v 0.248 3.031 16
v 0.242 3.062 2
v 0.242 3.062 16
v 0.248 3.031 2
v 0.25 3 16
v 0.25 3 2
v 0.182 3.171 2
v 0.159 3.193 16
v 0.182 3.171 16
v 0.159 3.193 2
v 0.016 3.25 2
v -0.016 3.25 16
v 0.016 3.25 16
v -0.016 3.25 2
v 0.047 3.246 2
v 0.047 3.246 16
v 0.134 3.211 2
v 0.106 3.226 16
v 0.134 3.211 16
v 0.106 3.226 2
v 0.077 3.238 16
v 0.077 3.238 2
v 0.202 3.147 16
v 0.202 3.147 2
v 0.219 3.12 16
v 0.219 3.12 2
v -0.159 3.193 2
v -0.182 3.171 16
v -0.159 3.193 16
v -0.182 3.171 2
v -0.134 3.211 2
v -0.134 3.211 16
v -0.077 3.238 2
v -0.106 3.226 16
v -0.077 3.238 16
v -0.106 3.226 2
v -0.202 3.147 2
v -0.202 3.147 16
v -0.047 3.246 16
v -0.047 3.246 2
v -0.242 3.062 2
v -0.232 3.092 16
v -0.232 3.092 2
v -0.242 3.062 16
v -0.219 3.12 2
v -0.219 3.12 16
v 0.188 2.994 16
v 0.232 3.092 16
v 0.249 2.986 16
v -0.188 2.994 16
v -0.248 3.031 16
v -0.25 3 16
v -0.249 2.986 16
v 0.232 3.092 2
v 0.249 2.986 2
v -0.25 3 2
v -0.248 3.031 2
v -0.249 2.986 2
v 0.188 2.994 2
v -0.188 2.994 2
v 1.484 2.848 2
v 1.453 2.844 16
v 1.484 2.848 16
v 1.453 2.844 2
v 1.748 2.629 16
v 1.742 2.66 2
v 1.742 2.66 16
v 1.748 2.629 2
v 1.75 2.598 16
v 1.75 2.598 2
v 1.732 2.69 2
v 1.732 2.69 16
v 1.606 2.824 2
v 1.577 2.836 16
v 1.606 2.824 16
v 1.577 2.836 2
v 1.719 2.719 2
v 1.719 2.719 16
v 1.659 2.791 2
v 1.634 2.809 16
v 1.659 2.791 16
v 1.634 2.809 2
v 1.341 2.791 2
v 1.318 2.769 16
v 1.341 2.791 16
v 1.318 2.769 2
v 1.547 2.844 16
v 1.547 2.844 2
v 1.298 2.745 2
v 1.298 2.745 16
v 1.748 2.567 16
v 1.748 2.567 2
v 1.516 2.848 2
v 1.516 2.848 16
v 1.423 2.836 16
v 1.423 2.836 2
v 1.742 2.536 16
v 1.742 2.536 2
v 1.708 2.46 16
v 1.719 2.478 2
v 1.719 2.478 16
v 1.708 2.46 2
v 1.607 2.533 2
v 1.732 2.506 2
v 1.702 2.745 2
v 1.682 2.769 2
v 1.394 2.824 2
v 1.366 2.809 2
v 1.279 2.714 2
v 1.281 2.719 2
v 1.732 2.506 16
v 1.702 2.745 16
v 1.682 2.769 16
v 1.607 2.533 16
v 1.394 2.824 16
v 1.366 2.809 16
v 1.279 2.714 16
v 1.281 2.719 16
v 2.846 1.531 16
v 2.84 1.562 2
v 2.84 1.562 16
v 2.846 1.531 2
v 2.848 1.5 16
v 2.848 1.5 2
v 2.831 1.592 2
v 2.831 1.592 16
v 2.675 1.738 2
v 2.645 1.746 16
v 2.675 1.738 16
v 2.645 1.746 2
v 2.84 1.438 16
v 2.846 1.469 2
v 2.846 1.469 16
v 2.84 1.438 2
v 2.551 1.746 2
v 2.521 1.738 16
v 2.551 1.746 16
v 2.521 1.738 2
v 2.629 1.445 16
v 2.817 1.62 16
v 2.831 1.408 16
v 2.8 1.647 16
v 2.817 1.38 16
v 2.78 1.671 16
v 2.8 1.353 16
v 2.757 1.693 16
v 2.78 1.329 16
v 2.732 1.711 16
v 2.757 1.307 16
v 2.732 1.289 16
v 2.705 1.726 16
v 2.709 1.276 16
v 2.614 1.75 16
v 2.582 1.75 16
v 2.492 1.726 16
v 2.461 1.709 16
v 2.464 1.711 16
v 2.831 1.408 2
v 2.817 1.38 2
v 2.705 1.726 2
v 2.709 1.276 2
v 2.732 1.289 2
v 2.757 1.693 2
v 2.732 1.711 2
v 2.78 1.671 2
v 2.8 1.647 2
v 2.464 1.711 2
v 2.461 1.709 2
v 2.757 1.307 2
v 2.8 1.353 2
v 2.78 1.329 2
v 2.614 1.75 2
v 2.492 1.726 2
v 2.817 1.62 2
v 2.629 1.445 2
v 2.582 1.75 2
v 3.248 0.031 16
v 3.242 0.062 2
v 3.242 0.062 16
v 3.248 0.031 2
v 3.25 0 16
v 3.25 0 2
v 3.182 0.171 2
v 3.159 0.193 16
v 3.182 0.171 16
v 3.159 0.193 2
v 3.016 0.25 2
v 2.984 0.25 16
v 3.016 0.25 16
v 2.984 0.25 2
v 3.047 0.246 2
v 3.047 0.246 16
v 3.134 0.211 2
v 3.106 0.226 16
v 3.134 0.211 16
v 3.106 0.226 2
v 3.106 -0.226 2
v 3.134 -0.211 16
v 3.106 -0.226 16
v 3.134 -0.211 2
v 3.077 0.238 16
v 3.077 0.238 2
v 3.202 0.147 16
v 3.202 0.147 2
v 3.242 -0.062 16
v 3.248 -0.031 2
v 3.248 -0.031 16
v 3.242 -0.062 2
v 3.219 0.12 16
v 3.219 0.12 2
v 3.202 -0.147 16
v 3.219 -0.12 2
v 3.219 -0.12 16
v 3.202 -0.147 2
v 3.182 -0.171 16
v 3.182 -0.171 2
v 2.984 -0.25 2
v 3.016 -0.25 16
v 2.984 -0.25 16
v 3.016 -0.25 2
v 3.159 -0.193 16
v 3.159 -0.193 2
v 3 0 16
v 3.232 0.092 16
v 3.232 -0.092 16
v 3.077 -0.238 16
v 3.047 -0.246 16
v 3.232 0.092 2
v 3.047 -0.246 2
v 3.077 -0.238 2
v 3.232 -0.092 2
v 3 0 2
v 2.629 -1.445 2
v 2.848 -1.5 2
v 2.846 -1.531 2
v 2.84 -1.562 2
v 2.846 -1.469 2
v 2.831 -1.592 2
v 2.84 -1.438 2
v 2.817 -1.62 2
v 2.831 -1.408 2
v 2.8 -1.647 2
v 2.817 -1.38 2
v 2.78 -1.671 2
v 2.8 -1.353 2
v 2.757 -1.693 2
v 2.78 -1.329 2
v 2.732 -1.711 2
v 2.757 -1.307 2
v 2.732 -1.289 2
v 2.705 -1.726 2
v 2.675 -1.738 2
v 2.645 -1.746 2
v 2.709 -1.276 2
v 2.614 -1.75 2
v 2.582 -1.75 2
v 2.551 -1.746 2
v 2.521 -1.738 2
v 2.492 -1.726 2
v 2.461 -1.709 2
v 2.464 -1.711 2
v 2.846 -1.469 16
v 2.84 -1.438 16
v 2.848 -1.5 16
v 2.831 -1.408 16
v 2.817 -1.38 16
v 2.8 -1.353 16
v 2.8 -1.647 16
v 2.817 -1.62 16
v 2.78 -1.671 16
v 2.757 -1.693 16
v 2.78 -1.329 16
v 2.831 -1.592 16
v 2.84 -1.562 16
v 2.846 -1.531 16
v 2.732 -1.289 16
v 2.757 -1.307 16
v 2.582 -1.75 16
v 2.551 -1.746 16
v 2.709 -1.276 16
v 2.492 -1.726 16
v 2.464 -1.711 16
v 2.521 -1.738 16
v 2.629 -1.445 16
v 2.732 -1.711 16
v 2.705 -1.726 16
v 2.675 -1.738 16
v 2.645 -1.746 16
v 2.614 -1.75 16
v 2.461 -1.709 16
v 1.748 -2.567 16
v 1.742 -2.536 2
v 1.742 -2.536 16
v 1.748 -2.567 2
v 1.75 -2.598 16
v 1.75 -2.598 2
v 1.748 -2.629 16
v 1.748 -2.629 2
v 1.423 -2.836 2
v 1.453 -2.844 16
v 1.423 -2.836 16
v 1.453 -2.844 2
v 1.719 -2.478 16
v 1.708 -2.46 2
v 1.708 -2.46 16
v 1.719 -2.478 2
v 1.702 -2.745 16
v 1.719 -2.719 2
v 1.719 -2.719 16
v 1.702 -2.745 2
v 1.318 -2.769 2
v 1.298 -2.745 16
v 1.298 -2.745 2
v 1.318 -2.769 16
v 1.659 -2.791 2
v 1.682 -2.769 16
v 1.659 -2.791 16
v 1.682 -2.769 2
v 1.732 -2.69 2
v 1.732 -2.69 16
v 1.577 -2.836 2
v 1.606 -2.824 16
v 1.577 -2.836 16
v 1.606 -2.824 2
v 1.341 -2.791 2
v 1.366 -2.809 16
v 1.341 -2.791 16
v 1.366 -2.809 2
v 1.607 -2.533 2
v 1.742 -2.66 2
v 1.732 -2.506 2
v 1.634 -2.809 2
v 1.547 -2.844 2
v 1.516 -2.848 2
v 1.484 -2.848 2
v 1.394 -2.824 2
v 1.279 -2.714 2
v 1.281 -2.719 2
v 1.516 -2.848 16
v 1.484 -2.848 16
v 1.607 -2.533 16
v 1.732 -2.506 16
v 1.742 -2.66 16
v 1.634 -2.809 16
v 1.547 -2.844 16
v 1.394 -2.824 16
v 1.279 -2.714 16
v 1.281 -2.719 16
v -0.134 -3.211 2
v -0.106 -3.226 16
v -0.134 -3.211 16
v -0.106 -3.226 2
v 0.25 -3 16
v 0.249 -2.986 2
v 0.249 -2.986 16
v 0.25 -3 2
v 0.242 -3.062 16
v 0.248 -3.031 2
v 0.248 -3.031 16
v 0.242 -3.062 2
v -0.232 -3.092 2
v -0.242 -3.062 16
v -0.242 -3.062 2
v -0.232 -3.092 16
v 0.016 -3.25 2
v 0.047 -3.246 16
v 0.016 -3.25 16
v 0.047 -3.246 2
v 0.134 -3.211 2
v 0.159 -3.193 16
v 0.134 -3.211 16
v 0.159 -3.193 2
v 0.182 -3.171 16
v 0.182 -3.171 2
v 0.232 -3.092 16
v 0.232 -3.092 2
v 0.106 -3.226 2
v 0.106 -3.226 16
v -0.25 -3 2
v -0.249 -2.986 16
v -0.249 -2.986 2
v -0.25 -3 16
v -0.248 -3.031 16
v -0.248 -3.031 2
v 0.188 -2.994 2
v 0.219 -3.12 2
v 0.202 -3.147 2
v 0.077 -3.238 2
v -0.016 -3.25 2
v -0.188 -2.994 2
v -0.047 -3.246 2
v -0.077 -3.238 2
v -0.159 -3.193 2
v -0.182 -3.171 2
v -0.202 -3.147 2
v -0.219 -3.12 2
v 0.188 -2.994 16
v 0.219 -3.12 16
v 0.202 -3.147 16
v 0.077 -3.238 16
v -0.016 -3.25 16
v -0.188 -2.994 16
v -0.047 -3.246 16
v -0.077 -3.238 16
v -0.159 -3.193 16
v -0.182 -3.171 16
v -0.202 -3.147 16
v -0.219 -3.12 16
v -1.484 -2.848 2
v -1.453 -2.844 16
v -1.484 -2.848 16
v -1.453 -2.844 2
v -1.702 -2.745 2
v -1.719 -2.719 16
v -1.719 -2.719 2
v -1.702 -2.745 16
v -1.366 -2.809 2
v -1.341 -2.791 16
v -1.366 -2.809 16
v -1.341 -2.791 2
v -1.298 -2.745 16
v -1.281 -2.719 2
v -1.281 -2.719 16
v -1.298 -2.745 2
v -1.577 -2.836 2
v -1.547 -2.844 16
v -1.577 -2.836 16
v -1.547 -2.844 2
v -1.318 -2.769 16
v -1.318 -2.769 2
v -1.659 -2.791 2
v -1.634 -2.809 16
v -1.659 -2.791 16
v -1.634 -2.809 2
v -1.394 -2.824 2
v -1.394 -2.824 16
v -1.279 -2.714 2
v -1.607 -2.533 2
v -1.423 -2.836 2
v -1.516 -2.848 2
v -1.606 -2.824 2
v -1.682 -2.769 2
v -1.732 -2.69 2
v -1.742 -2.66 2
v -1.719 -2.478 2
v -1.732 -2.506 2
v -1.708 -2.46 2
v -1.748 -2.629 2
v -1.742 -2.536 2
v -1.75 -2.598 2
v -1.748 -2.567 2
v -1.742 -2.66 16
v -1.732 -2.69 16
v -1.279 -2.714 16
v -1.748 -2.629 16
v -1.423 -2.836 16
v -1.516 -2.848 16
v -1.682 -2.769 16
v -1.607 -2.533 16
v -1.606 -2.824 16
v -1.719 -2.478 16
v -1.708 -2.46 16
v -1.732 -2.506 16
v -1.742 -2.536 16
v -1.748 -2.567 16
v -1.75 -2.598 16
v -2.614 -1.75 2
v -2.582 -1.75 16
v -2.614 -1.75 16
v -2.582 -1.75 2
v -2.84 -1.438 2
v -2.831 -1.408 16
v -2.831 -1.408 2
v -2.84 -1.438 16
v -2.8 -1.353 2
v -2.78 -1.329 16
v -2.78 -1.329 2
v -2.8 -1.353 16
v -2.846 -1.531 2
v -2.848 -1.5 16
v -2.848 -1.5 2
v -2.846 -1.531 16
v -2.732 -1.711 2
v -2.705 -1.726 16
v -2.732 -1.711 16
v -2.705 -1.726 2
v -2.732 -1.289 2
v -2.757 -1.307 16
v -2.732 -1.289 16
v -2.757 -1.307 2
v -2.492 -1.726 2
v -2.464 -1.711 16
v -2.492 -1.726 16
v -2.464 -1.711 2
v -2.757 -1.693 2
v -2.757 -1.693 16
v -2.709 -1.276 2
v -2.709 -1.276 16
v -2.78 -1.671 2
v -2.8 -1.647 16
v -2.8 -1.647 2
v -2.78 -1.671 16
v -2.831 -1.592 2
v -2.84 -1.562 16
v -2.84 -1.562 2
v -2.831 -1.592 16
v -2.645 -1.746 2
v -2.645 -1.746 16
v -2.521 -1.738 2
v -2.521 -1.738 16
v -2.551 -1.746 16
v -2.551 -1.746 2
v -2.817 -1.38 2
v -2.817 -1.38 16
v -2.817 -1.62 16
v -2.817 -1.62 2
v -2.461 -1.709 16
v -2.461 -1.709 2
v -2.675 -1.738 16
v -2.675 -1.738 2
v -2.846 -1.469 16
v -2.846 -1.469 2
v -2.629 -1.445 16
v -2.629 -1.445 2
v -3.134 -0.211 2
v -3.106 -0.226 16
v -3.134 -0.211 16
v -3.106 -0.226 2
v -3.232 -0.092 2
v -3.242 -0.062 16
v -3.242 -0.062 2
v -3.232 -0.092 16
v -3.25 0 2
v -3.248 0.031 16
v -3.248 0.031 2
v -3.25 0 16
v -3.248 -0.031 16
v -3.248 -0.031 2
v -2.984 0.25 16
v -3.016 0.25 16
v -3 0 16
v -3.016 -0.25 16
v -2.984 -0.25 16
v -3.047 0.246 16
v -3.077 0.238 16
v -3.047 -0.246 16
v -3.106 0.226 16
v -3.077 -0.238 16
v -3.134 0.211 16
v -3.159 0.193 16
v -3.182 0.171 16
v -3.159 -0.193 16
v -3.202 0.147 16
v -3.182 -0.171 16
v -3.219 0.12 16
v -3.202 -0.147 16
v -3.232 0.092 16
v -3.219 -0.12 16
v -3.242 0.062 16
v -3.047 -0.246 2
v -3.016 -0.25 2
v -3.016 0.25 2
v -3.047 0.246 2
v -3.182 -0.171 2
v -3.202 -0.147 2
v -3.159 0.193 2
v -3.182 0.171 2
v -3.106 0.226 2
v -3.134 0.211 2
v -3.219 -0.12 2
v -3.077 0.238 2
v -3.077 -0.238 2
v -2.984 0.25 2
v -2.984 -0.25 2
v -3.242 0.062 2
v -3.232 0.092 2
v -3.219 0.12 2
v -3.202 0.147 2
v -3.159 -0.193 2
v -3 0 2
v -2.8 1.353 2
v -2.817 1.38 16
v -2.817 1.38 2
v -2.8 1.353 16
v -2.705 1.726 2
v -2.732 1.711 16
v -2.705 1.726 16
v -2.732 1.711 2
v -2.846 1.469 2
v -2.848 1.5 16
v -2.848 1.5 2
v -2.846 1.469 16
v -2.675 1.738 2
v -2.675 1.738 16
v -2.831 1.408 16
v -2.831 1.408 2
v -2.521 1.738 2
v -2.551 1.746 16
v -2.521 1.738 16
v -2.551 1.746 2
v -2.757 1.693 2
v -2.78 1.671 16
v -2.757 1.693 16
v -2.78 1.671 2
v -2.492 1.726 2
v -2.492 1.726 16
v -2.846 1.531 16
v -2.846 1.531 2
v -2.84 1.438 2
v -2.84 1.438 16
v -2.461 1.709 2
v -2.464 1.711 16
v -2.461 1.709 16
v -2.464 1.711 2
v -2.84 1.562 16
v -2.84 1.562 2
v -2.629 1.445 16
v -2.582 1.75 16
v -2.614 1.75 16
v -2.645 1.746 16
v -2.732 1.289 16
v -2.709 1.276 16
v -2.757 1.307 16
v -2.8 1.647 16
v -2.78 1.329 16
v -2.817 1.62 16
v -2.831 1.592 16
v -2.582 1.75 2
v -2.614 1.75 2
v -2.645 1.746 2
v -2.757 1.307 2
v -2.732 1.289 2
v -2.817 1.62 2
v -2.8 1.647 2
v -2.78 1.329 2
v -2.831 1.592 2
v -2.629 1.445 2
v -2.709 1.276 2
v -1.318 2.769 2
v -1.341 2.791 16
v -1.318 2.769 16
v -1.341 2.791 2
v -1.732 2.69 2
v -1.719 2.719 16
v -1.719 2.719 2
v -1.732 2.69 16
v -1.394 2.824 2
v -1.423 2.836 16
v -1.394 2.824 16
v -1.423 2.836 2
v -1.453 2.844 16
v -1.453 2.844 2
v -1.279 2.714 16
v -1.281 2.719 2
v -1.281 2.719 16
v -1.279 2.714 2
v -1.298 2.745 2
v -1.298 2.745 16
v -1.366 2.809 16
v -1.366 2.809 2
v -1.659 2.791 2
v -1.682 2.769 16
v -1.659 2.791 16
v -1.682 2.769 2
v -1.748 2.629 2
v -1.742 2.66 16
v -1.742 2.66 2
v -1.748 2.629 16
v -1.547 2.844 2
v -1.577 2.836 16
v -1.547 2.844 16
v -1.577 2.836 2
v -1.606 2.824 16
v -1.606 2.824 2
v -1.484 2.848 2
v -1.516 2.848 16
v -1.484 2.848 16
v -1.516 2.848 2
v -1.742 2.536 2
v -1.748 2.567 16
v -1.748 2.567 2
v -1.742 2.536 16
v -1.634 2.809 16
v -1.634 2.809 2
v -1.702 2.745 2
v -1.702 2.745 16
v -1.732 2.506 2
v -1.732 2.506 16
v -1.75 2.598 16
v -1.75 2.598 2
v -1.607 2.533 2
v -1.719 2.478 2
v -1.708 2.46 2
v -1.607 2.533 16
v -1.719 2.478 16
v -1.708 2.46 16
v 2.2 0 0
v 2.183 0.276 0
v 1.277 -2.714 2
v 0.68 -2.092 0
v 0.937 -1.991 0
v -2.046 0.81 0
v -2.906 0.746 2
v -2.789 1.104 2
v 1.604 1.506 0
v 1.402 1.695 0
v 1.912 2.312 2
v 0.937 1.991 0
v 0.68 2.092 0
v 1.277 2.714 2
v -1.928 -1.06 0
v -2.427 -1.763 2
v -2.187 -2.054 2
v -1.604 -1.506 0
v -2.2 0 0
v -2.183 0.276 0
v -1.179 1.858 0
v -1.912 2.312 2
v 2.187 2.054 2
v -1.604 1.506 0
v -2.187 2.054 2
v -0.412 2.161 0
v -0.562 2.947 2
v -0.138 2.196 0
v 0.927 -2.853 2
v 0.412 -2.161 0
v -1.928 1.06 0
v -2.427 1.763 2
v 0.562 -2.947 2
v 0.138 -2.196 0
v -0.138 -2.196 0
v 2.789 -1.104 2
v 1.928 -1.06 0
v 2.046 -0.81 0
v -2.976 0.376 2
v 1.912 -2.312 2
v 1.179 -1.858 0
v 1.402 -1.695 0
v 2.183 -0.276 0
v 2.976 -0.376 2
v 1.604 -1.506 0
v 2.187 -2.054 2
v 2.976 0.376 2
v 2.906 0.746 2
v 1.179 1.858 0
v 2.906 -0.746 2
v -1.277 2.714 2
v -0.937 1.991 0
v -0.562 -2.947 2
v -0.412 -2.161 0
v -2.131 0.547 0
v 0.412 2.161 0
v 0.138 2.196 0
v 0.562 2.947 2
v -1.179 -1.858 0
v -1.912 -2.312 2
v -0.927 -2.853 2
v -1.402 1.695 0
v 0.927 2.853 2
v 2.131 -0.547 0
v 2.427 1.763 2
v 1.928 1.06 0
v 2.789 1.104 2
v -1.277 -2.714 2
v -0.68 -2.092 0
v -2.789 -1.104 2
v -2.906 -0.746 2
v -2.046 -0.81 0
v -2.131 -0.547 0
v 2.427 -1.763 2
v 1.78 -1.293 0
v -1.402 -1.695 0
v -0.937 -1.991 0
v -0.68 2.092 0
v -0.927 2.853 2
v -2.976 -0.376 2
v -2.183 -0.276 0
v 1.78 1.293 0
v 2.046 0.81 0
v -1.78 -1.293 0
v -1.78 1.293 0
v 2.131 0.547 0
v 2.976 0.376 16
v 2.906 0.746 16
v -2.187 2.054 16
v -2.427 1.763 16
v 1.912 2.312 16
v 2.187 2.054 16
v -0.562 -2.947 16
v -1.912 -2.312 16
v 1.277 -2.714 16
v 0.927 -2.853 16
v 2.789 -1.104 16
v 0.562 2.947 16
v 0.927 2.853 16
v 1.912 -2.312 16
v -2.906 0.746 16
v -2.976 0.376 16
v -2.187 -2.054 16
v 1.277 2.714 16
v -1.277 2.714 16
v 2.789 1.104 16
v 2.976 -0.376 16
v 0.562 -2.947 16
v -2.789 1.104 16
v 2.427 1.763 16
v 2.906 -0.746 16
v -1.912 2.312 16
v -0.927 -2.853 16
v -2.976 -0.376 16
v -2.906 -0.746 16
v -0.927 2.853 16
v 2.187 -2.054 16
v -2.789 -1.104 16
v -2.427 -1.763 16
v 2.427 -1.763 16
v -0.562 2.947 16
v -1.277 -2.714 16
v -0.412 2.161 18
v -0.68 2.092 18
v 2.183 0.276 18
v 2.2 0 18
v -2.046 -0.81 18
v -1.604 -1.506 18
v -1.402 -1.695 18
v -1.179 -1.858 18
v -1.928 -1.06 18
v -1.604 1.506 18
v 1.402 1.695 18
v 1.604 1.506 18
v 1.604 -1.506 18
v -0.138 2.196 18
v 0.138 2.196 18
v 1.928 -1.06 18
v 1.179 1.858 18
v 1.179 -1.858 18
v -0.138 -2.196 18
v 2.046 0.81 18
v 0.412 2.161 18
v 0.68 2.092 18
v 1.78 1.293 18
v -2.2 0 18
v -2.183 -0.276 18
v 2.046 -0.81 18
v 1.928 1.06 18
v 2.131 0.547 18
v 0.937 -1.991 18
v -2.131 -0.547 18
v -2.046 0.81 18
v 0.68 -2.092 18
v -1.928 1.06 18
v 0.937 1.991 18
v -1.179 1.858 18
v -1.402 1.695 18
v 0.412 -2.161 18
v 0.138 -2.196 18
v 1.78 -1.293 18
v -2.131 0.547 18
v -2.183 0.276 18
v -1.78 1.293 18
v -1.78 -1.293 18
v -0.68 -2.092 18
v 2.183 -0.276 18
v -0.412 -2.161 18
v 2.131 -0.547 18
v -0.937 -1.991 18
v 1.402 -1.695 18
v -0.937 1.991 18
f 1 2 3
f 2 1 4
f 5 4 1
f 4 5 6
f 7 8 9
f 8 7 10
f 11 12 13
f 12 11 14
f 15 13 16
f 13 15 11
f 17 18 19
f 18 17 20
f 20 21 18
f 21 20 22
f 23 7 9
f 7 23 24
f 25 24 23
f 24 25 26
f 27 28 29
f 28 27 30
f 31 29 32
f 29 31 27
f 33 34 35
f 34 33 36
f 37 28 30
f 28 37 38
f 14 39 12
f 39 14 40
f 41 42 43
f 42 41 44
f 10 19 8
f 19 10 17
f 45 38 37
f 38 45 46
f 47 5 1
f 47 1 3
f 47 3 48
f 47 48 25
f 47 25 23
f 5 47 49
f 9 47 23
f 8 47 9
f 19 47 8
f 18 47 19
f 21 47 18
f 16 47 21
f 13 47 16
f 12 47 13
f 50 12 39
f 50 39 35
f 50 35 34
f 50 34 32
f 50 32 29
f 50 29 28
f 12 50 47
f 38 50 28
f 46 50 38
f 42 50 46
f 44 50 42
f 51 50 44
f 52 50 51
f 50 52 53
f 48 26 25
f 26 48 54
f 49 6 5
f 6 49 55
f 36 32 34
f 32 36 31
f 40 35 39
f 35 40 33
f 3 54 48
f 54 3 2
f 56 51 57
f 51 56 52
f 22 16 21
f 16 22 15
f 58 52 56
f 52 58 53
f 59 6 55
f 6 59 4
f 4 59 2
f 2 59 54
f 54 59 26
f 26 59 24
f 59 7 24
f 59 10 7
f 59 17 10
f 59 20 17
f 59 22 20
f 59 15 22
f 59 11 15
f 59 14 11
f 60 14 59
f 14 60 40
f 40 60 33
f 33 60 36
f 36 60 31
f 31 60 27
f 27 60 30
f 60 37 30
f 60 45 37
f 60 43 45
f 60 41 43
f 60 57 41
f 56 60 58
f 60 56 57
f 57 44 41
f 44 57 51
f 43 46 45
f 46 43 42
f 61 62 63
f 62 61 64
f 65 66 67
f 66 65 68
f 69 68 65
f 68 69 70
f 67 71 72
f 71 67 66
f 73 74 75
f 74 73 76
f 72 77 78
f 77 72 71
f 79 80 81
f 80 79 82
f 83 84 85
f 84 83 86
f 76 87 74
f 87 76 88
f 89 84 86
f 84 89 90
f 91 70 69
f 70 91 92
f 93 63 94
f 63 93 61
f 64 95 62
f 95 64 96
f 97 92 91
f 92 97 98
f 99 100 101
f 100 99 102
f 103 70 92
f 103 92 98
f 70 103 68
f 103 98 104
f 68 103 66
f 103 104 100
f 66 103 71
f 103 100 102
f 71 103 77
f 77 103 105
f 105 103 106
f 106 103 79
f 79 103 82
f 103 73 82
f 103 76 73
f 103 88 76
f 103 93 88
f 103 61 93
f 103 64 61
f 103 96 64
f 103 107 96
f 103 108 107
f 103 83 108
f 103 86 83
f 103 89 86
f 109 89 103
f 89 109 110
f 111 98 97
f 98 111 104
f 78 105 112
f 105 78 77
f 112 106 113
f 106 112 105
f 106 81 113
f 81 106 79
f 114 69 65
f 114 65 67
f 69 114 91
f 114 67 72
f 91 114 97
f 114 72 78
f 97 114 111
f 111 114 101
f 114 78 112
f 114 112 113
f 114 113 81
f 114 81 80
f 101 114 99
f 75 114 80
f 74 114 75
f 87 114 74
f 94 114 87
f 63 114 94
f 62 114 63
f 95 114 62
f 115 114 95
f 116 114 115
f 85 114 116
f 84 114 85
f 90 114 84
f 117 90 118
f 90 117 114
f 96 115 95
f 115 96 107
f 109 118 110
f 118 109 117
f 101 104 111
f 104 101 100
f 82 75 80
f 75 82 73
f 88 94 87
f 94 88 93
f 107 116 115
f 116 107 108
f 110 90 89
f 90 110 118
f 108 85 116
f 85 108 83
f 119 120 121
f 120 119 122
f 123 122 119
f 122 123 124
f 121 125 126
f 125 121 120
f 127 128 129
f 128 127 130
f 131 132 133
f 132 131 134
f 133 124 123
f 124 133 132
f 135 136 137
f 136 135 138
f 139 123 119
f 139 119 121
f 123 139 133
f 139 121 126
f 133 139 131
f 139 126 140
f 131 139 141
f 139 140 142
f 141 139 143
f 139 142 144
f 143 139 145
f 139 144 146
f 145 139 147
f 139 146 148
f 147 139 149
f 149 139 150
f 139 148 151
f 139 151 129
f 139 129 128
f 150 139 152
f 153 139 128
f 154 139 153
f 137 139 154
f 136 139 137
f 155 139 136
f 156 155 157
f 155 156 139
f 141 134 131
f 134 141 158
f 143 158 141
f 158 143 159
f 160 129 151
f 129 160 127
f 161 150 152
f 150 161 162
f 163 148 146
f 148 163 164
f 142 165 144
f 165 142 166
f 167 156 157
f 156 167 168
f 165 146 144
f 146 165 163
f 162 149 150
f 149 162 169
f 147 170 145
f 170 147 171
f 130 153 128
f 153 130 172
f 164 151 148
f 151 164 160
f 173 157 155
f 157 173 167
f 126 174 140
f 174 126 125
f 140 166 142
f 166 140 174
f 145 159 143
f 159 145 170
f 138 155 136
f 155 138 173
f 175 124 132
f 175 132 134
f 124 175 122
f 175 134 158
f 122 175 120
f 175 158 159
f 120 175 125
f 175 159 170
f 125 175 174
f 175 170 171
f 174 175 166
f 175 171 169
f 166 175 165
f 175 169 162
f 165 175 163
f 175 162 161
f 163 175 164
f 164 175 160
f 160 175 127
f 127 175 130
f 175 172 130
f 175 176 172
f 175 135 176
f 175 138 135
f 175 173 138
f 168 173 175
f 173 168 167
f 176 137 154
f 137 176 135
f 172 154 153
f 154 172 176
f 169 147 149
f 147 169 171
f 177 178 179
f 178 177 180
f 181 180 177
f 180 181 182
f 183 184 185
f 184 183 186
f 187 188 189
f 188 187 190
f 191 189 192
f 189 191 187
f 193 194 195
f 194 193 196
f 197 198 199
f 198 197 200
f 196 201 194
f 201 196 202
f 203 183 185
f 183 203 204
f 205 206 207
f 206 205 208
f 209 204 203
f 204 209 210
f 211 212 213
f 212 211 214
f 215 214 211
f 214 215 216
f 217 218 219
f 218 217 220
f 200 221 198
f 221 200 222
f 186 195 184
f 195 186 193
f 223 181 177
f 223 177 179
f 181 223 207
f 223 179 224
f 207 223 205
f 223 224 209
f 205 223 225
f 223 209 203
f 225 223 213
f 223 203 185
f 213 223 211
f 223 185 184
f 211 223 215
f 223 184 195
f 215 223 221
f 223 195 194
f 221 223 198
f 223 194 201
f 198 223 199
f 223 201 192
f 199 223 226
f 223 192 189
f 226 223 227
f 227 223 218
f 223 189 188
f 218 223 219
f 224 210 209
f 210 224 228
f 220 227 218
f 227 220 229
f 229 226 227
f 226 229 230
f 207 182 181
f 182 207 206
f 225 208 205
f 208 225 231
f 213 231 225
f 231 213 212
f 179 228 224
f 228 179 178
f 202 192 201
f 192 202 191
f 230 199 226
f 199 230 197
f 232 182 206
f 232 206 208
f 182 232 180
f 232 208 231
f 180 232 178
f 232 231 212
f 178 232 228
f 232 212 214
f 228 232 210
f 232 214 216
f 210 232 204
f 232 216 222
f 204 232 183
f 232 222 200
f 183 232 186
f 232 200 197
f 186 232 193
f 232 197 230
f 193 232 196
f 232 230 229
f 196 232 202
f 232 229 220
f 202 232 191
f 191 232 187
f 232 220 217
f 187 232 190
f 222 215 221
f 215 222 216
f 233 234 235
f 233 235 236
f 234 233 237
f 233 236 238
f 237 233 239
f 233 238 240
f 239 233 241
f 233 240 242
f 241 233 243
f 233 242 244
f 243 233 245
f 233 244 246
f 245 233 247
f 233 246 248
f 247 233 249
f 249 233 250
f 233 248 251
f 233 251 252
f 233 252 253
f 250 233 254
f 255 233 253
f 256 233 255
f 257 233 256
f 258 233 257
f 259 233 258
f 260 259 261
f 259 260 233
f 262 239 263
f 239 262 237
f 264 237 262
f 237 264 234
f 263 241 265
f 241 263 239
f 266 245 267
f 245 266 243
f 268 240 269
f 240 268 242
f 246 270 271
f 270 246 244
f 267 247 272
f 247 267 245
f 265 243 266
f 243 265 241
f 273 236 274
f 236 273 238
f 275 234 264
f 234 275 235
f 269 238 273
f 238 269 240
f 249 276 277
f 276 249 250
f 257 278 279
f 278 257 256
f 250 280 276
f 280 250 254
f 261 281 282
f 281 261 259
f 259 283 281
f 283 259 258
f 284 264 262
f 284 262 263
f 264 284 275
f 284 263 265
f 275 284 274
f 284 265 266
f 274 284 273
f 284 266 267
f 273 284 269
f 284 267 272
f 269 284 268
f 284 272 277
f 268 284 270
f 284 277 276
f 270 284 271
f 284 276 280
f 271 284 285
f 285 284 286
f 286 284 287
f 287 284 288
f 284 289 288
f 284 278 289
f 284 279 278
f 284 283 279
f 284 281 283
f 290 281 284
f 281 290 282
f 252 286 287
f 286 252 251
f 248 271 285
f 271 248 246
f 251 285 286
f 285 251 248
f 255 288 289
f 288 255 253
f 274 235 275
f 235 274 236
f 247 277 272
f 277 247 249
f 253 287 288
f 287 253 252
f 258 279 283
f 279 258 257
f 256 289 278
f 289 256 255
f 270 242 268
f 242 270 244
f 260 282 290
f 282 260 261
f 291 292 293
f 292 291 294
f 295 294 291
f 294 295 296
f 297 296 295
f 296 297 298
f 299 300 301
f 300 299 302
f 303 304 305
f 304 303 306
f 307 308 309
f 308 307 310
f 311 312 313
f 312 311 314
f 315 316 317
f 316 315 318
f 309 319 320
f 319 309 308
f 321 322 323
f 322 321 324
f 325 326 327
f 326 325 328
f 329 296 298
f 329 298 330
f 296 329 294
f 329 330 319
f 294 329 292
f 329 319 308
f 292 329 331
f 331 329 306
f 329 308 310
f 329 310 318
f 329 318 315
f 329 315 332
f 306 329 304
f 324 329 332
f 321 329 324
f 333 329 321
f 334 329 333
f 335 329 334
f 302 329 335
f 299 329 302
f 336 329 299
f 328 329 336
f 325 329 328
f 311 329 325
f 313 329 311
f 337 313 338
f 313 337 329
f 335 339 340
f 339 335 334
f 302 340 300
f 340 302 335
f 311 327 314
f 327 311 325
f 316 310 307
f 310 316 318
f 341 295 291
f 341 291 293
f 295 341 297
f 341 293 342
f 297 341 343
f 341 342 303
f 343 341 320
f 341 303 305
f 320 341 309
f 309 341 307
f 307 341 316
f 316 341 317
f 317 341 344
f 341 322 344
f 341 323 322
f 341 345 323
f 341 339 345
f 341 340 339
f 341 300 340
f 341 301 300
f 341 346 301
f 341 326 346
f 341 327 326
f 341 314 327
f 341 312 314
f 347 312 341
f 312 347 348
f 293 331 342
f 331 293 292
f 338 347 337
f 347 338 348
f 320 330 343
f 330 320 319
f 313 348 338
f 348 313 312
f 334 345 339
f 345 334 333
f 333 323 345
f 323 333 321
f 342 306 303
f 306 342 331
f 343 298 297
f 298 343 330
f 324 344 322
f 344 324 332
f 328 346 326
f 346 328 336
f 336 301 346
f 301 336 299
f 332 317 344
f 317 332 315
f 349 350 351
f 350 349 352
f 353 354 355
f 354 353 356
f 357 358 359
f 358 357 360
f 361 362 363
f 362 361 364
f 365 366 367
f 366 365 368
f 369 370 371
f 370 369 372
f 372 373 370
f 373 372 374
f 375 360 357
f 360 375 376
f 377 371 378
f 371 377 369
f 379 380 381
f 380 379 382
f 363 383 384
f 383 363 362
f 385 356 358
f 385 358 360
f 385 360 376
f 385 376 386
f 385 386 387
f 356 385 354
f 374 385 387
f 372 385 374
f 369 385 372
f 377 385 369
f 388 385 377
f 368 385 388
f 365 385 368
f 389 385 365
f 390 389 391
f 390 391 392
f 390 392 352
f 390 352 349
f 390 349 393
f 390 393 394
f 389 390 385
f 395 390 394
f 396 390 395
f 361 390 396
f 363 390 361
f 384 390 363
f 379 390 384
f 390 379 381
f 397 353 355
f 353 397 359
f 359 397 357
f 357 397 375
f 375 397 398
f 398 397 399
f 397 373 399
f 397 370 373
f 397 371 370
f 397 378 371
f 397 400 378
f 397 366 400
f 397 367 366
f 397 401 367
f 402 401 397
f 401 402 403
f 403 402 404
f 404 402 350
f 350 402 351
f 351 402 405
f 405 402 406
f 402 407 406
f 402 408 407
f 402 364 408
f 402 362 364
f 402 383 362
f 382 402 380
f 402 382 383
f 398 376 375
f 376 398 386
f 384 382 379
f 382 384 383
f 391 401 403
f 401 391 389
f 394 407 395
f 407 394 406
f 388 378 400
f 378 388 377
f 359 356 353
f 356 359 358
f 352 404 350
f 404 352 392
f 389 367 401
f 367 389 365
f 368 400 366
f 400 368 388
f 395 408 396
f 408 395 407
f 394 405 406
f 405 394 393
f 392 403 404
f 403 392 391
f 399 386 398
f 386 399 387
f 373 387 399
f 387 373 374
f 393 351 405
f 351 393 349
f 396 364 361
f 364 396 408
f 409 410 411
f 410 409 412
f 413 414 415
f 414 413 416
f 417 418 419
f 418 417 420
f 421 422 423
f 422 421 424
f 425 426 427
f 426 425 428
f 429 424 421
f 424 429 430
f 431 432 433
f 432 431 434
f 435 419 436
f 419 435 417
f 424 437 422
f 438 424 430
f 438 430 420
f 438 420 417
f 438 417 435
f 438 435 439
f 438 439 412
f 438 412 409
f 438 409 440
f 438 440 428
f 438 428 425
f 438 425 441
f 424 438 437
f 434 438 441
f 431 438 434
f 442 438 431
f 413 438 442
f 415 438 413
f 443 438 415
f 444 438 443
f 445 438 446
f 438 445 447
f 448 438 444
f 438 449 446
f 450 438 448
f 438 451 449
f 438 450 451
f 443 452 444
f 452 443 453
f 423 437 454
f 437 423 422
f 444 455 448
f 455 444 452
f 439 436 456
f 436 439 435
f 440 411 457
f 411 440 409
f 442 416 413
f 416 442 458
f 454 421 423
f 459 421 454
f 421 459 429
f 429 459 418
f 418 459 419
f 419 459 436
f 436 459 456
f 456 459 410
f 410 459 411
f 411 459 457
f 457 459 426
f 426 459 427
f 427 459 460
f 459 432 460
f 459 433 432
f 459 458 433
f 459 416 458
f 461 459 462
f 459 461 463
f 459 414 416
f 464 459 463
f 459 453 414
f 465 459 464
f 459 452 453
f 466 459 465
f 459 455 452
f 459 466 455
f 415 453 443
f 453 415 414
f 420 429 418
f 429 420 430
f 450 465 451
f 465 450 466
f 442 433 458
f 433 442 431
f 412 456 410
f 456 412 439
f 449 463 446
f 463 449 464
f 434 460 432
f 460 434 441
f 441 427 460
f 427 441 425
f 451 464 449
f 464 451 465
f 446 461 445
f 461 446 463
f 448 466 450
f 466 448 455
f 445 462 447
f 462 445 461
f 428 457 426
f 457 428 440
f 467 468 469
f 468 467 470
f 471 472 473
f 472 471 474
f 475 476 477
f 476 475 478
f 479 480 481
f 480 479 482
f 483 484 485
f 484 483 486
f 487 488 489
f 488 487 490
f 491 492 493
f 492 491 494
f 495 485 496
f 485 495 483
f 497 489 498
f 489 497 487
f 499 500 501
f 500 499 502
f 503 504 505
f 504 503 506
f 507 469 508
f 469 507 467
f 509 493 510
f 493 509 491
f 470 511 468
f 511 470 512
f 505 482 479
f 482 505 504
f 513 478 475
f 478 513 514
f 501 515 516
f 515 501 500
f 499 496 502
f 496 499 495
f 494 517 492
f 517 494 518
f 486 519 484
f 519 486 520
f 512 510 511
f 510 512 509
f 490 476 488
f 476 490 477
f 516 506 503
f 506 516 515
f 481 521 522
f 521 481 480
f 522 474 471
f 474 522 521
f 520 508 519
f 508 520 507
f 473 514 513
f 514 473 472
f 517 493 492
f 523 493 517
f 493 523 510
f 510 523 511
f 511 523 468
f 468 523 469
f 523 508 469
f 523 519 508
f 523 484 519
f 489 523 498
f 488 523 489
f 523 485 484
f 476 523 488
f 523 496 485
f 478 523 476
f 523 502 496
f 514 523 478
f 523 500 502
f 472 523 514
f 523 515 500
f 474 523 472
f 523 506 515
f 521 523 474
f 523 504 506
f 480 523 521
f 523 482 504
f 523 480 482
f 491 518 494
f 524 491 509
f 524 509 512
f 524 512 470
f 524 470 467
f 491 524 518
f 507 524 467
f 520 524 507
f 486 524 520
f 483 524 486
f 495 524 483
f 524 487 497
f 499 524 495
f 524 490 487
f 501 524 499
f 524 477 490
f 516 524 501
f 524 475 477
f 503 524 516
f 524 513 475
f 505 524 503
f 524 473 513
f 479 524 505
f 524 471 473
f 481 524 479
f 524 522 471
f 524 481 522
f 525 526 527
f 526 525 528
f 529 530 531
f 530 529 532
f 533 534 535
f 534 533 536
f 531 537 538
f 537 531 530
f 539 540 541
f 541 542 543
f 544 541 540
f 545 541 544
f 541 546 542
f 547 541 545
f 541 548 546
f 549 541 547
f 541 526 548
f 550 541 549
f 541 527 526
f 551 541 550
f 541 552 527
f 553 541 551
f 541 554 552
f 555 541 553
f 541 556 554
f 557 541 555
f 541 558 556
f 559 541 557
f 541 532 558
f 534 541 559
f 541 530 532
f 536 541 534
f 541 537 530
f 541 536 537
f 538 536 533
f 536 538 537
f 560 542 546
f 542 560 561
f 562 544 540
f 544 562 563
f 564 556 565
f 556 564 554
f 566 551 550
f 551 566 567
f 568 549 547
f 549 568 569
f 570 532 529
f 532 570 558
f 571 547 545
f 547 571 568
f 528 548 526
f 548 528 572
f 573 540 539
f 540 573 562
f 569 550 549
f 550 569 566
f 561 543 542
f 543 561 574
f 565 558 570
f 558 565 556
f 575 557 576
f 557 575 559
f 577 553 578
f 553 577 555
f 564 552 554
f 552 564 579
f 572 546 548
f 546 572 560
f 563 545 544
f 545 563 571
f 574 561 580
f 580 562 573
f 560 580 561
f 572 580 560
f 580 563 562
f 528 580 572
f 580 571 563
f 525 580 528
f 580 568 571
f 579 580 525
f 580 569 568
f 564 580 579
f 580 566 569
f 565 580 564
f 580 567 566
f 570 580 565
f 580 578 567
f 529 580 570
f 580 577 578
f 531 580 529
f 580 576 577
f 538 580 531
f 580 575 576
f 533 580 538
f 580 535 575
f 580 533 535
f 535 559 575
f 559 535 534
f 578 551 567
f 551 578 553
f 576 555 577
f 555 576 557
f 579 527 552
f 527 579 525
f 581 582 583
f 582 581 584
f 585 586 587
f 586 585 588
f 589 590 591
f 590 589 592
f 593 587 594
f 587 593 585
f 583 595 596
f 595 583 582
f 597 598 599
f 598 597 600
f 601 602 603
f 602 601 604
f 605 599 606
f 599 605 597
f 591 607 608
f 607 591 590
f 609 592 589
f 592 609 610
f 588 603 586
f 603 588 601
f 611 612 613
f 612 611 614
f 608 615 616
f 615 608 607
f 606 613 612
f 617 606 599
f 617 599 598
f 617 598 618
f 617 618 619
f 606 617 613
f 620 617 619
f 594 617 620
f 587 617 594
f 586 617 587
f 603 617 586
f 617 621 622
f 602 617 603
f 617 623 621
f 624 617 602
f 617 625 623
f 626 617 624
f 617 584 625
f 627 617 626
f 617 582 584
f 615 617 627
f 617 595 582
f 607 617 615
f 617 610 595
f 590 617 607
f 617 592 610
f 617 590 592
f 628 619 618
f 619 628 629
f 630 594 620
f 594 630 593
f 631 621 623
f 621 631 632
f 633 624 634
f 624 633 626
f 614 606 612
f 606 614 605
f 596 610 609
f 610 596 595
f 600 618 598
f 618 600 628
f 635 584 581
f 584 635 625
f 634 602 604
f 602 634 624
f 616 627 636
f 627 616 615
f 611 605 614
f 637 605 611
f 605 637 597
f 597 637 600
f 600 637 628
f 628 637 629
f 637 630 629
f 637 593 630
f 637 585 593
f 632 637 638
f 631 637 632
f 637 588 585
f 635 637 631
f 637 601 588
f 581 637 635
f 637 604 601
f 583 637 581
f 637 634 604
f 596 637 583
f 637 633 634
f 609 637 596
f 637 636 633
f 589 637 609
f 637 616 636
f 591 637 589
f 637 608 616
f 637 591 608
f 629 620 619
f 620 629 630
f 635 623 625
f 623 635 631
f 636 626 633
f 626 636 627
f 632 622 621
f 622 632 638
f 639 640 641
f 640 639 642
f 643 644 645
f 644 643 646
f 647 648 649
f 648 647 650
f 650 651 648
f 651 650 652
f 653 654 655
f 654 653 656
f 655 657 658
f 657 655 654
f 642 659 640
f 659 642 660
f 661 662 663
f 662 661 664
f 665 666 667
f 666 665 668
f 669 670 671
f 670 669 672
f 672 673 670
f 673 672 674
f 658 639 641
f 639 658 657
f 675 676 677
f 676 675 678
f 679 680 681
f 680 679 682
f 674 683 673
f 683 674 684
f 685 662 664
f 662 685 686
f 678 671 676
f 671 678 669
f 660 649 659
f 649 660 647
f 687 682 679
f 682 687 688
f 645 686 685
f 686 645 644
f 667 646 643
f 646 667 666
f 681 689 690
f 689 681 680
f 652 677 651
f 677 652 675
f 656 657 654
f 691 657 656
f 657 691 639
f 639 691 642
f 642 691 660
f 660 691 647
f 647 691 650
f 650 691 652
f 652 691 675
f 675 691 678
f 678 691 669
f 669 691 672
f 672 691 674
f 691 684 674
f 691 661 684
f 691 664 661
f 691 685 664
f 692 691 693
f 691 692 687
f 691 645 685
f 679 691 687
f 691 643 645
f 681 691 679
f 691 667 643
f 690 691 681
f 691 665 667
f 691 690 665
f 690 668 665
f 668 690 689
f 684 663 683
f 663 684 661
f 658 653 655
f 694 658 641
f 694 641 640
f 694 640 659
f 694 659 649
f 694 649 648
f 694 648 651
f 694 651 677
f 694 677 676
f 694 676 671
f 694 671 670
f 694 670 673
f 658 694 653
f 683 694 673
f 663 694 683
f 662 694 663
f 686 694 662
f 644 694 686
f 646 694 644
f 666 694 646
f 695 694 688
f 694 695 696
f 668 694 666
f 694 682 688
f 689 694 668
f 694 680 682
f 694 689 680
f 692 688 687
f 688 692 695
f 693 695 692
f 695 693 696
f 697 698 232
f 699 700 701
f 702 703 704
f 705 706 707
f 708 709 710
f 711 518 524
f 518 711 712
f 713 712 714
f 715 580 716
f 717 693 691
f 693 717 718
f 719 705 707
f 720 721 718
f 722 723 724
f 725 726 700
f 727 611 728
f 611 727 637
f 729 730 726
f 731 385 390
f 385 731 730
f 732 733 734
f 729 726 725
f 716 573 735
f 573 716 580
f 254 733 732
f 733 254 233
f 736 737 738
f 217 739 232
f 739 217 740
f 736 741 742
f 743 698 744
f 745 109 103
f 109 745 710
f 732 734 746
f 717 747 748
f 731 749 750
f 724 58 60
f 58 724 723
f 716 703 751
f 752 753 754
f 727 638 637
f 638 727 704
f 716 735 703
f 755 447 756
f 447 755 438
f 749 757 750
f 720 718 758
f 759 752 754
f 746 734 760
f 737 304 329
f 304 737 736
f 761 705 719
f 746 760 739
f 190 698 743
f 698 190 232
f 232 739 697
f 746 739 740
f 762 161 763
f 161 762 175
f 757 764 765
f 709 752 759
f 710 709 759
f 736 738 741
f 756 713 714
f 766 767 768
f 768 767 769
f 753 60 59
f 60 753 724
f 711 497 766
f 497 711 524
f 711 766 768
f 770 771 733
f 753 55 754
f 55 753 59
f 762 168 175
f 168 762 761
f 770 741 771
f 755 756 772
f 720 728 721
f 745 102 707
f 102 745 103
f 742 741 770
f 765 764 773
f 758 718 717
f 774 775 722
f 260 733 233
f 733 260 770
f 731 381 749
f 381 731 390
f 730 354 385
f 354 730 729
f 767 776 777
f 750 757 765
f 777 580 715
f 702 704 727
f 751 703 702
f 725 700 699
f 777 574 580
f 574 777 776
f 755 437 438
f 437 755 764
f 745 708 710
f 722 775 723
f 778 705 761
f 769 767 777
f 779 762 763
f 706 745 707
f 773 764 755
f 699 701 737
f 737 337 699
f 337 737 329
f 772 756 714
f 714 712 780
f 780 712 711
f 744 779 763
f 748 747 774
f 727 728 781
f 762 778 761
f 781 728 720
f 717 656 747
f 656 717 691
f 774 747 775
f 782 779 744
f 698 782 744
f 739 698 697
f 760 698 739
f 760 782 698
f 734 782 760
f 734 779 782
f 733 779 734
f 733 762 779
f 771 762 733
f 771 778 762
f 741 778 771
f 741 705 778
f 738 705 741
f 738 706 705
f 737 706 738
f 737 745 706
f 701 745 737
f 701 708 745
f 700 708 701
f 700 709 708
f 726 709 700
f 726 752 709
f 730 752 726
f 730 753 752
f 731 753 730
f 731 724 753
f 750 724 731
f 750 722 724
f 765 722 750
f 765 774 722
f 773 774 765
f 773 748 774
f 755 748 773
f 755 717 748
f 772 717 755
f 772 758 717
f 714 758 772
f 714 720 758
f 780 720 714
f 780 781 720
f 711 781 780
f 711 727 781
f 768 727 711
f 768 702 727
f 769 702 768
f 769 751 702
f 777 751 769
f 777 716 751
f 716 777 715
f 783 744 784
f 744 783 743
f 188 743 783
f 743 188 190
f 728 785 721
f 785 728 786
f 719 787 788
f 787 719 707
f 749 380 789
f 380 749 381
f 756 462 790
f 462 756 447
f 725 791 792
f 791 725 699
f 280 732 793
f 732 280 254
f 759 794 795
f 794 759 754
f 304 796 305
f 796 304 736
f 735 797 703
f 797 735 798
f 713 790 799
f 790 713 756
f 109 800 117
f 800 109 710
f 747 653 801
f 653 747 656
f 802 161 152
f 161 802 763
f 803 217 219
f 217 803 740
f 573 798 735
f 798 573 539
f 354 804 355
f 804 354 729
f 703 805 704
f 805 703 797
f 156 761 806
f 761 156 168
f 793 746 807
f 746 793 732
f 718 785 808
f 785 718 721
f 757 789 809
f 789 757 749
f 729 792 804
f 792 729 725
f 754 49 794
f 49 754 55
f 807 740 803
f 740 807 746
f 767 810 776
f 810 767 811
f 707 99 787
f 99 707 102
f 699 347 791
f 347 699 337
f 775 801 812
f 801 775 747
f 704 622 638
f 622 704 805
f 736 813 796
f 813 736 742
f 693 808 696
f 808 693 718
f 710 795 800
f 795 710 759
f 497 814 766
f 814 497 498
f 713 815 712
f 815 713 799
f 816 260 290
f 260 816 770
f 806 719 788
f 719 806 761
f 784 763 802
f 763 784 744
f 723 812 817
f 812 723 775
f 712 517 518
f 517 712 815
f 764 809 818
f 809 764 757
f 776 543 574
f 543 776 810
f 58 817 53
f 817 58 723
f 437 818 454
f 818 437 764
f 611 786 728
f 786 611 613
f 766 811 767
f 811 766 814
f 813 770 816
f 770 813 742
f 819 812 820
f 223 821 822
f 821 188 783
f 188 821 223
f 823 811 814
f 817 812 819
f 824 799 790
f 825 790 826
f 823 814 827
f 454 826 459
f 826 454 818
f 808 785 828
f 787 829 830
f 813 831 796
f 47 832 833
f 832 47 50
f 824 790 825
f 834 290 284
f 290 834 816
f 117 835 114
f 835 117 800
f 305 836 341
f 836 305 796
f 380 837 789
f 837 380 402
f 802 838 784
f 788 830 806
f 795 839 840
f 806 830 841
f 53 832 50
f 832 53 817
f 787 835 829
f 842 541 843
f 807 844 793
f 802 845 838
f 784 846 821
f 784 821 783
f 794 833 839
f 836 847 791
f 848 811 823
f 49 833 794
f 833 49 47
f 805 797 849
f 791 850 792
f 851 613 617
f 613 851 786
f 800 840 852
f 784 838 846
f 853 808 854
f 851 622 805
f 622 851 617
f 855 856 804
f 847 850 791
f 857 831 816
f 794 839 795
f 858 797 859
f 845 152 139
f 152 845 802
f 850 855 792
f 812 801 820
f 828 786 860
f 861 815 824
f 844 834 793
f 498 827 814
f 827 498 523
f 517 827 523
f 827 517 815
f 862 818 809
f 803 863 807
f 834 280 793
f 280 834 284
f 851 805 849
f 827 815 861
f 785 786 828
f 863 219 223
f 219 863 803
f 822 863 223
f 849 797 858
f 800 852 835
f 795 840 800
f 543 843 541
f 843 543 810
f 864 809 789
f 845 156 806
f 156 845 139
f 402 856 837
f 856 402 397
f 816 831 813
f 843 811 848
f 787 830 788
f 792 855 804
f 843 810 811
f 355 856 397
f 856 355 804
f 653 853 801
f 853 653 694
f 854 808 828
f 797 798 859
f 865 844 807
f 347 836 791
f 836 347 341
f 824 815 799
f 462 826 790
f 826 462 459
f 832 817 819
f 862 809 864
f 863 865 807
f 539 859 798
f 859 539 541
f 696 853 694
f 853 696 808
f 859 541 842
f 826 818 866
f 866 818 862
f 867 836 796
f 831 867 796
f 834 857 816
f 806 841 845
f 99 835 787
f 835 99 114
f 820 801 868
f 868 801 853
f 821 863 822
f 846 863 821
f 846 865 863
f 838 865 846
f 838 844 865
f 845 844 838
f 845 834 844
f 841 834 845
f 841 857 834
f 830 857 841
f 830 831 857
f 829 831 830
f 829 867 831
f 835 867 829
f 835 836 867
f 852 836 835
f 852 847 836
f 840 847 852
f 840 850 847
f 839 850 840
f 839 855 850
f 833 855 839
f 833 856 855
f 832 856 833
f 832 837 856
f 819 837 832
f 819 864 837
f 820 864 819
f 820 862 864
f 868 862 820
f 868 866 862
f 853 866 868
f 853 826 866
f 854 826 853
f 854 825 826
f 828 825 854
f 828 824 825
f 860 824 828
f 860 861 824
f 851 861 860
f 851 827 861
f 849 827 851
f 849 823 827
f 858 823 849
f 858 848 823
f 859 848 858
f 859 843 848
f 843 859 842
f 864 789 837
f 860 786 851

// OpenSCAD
/*
    This mimics a wooden dowel pin used for joinery. The advantage is you can control 
    the dimensions. The disadvantage is that the wood glue won't penetrate the 
    plastic as it would with wood.
    
    Author: Alex Kazim
*/

/* [Main] */
// overall length including the caps
pin_length = 18;

// diameter excluding the ribs
pin_diameter = 6; 

// height of each end-cap
cap_h = 2;          // [0:5]


/* [Misc] */
// number of ribs around the core
num_ribs = 12;          // [0:30]

// radius of each rib
rib_radius = 0.25;

// rendering quality
$fn = 50;

/* [Hidden] */

// calcs
cap_r1 = pin_diameter/2 - 0.8;  // 20% drop in diameter for the end-cap
cap_r2 = pin_diameter/2;

dowel_l = pin_length - 2*cap_h;

union() {
    // cap
    cylinder(cap_h,cap_r1,cap_r2,center=false);
    
    // body
    translate([0,0,cap_h]) {
        cylinder(dowel_l,r=pin_diameter/2);
    }
    
    // cap
    translate([0,0,pin_length - cap_h]) {
        cylinder(cap_h,cap_r2,cap_r1,center=false);
    }
    
    // ribs
    if (num_ribs > 0) {
        for (i = [0:num_ribs - 1]) {
            translate([sin(360*i/num_ribs)*(pin_diameter/2), cos(360*i/num_ribs)*(pin_diameter/2),cap_h]) {
                color([1,0,0]) cylinder(h=dowel_l,r=rib_radius);
            }
        }
    }
}
